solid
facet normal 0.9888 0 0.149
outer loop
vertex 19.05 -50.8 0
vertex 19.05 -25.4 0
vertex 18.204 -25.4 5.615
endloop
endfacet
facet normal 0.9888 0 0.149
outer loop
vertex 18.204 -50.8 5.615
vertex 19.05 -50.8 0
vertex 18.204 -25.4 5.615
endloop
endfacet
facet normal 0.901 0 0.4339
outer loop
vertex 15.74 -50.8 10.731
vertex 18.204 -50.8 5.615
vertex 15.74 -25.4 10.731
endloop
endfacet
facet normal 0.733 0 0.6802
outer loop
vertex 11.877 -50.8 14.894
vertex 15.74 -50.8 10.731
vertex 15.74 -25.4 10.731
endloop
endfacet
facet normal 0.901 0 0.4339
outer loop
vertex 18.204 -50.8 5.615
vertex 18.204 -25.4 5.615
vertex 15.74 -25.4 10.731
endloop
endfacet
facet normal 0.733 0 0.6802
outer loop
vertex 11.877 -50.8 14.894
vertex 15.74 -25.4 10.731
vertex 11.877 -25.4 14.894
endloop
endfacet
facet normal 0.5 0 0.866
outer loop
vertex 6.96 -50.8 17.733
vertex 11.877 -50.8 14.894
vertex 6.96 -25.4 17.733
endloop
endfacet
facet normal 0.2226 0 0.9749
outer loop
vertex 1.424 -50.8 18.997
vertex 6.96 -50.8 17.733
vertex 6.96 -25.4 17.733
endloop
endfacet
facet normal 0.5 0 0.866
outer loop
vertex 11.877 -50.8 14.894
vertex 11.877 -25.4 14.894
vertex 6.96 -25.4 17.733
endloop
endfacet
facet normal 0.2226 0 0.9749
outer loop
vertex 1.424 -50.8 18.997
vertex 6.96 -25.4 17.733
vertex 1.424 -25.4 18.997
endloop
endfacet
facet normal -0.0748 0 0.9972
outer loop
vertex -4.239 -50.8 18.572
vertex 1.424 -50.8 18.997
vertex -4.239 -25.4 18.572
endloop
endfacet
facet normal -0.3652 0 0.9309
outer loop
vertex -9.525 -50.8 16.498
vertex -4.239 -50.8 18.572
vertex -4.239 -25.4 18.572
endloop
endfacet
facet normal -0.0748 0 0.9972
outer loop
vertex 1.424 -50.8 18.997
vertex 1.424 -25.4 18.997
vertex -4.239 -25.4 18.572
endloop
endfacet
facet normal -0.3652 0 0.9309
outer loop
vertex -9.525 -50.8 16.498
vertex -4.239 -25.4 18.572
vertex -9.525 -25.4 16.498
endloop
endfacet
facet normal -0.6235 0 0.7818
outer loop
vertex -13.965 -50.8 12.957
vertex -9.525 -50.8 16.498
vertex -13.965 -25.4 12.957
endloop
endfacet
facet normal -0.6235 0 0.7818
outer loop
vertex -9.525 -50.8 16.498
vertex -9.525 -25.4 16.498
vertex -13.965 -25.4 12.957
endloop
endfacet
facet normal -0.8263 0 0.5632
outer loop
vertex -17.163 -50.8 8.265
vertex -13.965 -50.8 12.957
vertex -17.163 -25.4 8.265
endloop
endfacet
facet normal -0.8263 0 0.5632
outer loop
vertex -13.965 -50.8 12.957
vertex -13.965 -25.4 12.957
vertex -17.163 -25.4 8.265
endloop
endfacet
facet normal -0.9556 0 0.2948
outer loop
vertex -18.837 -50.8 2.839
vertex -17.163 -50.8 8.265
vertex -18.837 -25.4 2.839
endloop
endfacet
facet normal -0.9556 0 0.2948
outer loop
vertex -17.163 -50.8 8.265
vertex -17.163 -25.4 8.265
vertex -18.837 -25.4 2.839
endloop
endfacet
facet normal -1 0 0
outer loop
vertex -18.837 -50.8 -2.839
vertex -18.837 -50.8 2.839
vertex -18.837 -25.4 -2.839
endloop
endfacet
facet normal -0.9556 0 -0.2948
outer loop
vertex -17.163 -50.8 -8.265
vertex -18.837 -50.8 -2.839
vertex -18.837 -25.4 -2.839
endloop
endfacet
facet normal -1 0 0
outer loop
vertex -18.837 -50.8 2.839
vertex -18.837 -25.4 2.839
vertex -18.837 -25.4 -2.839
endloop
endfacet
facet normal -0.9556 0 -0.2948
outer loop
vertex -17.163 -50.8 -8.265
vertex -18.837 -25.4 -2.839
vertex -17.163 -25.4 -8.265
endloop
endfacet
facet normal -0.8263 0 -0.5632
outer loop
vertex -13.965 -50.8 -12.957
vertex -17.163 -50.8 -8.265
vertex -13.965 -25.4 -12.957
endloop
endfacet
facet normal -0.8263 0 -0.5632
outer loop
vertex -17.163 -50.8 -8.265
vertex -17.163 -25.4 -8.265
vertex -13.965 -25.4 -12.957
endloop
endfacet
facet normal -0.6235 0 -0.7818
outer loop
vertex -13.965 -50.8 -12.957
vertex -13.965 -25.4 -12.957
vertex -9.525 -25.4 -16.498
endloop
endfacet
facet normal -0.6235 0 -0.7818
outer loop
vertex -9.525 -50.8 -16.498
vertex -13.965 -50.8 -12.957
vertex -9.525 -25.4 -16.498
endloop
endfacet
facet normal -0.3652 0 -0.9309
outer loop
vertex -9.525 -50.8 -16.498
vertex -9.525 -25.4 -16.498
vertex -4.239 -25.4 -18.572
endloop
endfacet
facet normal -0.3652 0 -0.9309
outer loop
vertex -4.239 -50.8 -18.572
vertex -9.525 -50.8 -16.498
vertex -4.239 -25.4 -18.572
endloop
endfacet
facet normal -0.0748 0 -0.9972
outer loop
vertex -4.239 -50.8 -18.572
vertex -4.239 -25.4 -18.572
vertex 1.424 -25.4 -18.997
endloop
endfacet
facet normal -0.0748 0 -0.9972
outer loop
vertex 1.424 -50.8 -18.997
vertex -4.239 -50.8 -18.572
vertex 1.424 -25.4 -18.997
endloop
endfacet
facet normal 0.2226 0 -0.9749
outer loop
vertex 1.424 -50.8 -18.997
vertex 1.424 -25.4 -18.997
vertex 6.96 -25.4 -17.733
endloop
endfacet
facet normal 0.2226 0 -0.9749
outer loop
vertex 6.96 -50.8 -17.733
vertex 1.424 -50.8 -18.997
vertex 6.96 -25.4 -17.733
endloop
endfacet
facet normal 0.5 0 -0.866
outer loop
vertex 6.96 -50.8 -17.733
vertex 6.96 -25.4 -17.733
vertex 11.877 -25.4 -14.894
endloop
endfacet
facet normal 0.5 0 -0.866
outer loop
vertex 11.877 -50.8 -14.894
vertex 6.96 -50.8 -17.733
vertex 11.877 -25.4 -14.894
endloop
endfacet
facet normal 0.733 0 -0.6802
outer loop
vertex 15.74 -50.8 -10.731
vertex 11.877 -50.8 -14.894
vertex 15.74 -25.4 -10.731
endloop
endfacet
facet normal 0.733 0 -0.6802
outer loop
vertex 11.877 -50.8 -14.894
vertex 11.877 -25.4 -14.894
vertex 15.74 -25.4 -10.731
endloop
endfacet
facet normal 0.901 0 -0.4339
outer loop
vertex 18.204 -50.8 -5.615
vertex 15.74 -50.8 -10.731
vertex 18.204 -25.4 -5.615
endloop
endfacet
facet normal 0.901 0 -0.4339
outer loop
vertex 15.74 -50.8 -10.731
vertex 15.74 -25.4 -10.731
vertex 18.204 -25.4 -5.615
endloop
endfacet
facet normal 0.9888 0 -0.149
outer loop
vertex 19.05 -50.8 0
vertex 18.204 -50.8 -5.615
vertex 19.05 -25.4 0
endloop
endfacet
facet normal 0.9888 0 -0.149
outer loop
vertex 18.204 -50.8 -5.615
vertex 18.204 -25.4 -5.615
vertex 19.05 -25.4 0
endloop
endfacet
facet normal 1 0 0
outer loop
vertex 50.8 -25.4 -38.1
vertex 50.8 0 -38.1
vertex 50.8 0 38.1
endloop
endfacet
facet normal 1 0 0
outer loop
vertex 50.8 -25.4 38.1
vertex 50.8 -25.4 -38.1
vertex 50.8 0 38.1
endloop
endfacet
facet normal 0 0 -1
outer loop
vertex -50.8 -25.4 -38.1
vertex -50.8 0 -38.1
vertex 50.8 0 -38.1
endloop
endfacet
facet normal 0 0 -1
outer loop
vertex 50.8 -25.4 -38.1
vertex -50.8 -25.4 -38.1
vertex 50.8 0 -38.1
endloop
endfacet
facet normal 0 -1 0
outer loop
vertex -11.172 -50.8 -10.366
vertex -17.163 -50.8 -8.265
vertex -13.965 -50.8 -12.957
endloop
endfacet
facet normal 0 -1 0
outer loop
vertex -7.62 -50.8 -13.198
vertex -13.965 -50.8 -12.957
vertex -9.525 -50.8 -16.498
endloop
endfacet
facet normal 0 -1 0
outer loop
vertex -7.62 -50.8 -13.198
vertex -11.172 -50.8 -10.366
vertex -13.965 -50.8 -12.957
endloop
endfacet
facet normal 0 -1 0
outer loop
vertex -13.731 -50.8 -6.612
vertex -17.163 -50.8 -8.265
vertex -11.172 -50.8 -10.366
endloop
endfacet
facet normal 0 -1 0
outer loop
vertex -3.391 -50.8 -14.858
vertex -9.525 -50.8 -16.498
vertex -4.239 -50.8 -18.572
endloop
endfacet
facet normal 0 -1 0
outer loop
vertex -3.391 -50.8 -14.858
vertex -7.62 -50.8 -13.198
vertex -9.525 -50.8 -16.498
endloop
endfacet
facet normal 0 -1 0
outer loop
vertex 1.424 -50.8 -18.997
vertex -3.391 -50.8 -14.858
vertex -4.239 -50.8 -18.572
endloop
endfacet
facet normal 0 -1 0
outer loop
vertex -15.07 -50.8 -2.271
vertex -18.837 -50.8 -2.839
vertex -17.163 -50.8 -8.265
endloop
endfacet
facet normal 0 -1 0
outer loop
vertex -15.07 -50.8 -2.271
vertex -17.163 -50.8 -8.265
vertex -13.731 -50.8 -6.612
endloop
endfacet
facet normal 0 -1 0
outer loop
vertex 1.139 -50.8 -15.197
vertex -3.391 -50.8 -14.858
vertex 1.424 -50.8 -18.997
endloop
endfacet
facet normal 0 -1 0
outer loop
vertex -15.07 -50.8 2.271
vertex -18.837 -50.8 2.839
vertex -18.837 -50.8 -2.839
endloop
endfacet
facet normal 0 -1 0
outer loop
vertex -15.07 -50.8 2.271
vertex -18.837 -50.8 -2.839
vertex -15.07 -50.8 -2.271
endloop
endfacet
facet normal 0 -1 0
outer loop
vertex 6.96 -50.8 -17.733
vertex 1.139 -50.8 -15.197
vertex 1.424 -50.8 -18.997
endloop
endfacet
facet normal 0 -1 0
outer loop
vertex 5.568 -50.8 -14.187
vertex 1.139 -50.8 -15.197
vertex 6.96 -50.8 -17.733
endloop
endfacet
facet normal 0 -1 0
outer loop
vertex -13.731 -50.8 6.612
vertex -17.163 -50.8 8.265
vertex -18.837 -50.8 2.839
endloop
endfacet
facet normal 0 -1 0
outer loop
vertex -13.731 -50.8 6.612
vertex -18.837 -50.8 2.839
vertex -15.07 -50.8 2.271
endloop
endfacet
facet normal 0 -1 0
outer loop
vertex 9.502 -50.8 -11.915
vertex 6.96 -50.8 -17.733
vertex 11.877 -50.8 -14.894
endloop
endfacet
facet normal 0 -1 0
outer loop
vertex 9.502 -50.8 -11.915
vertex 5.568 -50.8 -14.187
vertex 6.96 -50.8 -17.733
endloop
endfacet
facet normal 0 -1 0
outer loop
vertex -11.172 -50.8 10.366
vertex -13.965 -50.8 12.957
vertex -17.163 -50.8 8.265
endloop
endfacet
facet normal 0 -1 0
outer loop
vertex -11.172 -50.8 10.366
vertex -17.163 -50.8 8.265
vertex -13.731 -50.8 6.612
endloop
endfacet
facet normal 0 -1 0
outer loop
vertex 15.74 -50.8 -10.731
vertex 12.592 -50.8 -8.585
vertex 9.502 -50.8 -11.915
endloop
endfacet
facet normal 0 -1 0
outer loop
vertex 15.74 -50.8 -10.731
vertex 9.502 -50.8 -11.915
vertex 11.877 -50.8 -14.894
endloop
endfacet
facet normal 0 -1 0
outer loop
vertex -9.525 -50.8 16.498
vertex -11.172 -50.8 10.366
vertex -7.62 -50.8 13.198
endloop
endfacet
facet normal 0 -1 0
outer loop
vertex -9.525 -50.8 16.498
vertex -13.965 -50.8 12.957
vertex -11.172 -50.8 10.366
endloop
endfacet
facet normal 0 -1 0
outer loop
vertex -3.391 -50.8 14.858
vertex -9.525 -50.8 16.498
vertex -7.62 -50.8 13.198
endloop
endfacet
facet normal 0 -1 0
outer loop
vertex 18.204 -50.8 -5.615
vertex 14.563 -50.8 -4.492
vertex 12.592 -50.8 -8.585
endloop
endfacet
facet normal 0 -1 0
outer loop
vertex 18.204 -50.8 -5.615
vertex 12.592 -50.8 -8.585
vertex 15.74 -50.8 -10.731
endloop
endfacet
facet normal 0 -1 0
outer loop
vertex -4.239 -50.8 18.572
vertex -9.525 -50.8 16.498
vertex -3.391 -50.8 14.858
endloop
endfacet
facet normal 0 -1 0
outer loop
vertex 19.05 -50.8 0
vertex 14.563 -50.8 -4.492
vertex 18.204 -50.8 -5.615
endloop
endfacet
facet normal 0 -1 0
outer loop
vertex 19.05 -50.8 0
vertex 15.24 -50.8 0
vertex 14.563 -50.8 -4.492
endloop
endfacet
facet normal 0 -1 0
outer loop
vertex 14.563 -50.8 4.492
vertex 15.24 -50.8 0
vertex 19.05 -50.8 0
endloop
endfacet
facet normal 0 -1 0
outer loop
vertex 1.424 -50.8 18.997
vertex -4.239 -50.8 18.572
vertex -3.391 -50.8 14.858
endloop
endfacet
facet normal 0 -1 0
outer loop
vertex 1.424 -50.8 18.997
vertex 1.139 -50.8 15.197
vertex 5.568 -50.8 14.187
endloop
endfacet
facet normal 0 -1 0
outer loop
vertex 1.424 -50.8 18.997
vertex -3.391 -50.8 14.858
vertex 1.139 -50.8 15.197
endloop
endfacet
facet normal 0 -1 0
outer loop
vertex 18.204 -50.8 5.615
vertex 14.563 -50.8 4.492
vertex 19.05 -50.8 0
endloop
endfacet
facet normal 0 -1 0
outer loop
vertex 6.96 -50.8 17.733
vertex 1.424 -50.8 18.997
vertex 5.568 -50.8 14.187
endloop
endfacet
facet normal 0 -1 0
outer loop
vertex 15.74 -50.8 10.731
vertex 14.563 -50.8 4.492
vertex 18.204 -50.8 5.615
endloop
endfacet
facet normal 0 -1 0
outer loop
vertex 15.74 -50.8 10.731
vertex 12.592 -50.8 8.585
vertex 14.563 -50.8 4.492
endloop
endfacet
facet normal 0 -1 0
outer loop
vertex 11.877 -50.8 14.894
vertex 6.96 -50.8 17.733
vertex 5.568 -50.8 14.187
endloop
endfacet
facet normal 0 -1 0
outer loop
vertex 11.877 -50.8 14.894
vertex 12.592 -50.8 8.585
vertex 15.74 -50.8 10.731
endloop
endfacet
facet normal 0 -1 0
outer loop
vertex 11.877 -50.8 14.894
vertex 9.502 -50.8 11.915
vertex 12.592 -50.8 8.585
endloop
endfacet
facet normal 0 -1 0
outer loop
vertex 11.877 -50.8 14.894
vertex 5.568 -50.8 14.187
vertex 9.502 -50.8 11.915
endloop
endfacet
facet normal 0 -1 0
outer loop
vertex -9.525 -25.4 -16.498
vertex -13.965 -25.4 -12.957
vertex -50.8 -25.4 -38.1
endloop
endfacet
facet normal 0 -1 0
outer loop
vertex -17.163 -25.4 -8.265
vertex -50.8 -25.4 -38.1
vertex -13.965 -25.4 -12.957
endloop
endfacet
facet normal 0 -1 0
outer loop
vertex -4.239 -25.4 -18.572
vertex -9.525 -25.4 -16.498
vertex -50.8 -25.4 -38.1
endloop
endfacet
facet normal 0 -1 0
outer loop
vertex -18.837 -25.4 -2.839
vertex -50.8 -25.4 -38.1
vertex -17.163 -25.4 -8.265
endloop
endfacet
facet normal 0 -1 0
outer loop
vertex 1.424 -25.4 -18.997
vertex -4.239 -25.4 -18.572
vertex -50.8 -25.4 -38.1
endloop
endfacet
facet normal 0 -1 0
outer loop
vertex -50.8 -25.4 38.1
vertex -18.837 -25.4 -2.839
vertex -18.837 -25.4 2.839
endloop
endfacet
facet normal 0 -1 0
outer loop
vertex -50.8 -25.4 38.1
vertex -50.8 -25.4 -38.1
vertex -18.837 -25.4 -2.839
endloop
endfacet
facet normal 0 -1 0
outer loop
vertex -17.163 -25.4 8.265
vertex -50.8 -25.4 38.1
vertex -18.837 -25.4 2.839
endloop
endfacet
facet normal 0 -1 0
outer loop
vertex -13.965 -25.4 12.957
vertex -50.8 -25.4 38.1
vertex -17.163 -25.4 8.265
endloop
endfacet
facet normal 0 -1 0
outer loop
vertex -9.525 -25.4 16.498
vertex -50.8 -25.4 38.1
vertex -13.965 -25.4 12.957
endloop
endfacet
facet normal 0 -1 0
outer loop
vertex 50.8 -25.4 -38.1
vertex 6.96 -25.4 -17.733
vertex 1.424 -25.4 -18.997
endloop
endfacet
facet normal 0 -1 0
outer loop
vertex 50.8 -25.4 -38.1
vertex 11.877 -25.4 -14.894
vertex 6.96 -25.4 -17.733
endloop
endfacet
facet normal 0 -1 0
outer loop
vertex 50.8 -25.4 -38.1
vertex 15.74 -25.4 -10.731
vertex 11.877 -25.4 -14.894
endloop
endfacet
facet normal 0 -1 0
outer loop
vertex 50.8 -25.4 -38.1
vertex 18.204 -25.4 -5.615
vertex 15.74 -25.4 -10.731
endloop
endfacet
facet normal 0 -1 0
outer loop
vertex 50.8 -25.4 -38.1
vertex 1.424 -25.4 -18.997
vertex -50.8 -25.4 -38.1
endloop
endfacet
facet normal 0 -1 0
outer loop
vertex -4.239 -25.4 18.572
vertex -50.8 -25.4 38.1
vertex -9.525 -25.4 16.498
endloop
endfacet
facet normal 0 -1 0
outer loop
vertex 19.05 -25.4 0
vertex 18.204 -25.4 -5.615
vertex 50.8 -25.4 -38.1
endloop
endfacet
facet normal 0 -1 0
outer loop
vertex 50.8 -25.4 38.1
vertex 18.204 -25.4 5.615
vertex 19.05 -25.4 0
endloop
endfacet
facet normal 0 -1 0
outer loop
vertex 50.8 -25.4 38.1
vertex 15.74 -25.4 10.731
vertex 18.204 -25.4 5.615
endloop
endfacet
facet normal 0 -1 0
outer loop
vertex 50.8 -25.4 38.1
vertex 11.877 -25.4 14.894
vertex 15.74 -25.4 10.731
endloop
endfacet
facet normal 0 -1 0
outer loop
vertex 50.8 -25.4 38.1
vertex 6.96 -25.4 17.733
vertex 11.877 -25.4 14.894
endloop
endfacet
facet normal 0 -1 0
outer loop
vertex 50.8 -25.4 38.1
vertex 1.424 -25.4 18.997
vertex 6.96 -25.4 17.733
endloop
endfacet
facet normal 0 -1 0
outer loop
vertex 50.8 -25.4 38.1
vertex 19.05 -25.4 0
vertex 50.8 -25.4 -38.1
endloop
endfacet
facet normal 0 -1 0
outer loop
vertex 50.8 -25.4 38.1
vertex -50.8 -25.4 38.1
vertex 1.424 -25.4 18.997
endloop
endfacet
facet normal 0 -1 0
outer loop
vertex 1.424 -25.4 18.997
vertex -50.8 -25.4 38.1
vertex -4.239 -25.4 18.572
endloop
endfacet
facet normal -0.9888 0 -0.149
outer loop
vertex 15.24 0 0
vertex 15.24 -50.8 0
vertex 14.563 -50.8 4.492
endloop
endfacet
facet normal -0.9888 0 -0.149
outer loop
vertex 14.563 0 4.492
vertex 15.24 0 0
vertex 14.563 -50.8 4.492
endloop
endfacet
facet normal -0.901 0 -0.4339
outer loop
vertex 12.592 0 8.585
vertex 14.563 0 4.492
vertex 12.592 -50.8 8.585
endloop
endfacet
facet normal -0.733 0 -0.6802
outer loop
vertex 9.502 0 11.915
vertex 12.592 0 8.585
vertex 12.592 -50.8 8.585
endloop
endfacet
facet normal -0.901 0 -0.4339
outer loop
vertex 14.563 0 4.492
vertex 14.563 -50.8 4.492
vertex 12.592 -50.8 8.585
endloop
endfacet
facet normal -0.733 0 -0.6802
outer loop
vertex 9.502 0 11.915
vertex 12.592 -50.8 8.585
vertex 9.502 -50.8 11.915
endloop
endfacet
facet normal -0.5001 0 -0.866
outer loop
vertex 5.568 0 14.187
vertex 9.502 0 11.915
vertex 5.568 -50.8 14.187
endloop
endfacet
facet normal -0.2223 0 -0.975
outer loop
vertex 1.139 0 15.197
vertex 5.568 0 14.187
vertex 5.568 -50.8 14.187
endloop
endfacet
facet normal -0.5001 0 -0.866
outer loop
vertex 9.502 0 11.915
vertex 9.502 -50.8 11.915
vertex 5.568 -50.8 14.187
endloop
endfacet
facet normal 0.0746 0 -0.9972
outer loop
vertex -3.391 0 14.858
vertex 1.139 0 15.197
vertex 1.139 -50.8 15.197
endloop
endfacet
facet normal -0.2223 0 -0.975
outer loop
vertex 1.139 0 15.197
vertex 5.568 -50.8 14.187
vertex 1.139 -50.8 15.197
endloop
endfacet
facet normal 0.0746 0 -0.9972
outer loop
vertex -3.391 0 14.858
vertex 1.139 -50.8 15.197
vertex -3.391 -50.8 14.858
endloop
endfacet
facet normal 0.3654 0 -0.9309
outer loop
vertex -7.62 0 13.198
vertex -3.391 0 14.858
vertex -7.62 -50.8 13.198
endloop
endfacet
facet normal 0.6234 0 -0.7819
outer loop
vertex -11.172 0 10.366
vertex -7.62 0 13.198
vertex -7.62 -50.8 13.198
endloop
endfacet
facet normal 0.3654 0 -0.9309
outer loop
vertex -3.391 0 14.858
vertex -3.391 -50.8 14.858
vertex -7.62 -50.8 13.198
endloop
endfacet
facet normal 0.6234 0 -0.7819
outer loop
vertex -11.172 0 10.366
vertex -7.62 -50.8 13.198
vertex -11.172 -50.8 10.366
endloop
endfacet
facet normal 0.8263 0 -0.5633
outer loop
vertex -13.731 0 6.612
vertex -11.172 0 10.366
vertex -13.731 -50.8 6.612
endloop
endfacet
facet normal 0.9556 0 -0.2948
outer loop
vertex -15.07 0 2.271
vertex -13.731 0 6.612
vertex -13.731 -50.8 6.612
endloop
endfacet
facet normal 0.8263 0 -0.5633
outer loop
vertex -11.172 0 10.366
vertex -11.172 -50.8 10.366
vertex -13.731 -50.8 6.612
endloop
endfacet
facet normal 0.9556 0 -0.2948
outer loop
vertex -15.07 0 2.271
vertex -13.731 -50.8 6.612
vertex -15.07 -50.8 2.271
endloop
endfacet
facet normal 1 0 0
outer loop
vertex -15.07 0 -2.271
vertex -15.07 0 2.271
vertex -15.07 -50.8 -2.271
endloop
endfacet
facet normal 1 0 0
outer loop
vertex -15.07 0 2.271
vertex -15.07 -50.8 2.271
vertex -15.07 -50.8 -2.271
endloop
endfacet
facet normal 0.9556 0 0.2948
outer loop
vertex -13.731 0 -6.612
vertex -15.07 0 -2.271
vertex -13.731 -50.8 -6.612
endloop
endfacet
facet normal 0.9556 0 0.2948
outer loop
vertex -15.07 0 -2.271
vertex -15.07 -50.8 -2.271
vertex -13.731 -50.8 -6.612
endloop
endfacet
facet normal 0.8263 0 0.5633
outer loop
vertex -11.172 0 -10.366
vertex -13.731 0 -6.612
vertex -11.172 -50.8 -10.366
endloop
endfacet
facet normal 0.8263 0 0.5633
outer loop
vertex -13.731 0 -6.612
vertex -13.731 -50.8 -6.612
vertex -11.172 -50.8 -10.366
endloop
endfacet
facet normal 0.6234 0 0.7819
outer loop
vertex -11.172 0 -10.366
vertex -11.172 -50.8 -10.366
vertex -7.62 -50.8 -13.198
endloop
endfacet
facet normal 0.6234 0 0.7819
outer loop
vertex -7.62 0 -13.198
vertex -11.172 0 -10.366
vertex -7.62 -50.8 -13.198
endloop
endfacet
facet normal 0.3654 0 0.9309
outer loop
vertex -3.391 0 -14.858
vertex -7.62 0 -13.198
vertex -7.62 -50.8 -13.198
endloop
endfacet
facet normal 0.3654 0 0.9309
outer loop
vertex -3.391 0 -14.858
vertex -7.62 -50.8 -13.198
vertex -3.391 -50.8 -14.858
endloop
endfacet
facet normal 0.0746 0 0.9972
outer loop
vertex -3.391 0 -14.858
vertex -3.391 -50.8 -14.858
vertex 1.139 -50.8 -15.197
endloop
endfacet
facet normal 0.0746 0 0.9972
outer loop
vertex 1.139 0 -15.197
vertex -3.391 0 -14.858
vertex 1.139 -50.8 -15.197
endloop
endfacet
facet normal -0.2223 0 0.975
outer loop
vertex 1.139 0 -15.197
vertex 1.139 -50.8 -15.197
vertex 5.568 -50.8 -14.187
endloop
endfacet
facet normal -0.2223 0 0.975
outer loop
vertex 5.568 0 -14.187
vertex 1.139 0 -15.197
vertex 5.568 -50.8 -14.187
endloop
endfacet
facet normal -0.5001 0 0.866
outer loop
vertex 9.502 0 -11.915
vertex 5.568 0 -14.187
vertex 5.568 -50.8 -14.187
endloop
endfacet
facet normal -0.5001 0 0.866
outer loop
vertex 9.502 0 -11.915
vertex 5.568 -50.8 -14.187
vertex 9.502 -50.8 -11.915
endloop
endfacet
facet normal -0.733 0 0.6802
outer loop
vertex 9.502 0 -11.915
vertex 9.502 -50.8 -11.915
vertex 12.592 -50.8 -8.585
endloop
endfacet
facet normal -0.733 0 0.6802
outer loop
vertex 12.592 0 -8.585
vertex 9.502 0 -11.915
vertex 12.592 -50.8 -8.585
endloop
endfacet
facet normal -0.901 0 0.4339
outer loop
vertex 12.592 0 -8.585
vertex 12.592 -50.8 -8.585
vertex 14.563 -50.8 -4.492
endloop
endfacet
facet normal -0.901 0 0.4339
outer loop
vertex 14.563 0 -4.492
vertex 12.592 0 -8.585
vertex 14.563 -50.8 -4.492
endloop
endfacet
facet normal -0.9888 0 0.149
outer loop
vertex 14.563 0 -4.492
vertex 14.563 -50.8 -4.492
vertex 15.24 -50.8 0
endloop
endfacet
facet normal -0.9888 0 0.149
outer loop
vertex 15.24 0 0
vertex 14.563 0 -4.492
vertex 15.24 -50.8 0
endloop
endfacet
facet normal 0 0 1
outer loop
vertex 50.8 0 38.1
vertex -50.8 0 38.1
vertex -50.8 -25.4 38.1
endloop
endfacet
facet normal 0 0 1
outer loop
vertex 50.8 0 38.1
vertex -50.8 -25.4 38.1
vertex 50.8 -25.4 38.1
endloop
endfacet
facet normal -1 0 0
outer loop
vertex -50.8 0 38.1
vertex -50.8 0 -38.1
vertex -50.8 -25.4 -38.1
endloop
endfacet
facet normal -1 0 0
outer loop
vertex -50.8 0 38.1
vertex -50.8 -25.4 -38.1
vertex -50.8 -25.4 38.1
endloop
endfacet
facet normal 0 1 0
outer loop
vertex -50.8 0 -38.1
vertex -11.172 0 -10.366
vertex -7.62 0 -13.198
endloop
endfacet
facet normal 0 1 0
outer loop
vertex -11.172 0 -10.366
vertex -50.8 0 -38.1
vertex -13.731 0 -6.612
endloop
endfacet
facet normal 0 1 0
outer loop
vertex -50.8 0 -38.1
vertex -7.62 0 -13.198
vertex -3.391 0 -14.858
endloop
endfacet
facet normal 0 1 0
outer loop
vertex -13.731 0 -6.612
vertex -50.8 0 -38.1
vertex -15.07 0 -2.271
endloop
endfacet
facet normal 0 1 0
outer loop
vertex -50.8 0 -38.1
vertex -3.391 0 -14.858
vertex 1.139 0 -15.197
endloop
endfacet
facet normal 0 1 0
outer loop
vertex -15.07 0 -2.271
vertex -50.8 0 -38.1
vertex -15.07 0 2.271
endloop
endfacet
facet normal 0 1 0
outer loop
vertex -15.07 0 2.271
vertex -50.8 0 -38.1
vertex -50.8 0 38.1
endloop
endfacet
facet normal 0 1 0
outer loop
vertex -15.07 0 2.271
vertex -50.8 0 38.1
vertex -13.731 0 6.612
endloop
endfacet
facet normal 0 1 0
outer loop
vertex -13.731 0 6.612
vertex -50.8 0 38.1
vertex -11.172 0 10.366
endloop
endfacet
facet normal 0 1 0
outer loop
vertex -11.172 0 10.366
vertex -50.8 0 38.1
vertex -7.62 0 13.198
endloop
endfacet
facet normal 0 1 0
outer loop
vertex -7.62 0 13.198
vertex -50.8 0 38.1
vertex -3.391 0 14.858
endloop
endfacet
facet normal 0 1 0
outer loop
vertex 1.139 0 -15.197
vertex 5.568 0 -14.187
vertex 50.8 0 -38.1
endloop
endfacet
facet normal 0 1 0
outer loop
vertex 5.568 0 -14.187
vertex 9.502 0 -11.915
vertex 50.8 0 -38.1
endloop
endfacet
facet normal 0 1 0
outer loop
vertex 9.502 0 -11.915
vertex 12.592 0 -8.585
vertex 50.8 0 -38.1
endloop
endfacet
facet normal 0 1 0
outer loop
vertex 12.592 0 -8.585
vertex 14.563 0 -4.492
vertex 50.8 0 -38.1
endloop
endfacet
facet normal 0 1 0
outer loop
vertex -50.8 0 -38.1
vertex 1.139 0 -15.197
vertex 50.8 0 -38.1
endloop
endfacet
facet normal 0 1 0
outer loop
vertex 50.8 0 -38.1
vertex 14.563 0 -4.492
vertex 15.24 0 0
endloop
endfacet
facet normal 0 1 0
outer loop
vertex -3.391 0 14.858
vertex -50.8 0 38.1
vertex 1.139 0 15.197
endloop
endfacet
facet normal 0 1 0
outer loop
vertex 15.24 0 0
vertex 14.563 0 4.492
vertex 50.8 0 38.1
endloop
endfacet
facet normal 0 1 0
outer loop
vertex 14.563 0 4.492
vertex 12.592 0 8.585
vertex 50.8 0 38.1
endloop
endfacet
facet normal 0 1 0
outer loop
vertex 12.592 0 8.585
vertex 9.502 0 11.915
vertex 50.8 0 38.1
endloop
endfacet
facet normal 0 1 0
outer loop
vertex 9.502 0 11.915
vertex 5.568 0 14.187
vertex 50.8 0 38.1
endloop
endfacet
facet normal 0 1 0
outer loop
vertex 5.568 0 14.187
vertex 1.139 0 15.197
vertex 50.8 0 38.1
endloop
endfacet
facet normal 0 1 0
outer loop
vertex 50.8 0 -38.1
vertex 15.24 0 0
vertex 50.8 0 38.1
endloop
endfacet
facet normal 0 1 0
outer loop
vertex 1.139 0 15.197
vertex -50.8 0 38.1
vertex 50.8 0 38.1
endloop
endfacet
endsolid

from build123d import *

# Parameters (mm, degrees)
F0_W     = 101.6
F0_H     = 76.2
F1_DEPTH = 25.4
F2_R     = 19.05
F3_DEPTH = 25.4
F4_R     = 15.24
F5_DEPTH = 76.2


with BuildPart() as f1:
    # F0 (on Front) → F1 (new body)
    with BuildSketch(Plane.XZ):
        Rectangle(F0_W, F0_H)
    extrude(amount=F1_DEPTH)

    # F2 (on face) → F3 (join)
    with BuildSketch(Plane.XZ.offset(25.4)):
        Circle(F2_R)
    extrude(amount=F3_DEPTH)

    # F4 (on face) → F5 (cut)
    with BuildSketch(Plane.XZ.offset(50.8)):
        Circle(F4_R)
    extrude(amount=-F5_DEPTH, mode=Mode.SUBTRACT)


solid = f1.part
